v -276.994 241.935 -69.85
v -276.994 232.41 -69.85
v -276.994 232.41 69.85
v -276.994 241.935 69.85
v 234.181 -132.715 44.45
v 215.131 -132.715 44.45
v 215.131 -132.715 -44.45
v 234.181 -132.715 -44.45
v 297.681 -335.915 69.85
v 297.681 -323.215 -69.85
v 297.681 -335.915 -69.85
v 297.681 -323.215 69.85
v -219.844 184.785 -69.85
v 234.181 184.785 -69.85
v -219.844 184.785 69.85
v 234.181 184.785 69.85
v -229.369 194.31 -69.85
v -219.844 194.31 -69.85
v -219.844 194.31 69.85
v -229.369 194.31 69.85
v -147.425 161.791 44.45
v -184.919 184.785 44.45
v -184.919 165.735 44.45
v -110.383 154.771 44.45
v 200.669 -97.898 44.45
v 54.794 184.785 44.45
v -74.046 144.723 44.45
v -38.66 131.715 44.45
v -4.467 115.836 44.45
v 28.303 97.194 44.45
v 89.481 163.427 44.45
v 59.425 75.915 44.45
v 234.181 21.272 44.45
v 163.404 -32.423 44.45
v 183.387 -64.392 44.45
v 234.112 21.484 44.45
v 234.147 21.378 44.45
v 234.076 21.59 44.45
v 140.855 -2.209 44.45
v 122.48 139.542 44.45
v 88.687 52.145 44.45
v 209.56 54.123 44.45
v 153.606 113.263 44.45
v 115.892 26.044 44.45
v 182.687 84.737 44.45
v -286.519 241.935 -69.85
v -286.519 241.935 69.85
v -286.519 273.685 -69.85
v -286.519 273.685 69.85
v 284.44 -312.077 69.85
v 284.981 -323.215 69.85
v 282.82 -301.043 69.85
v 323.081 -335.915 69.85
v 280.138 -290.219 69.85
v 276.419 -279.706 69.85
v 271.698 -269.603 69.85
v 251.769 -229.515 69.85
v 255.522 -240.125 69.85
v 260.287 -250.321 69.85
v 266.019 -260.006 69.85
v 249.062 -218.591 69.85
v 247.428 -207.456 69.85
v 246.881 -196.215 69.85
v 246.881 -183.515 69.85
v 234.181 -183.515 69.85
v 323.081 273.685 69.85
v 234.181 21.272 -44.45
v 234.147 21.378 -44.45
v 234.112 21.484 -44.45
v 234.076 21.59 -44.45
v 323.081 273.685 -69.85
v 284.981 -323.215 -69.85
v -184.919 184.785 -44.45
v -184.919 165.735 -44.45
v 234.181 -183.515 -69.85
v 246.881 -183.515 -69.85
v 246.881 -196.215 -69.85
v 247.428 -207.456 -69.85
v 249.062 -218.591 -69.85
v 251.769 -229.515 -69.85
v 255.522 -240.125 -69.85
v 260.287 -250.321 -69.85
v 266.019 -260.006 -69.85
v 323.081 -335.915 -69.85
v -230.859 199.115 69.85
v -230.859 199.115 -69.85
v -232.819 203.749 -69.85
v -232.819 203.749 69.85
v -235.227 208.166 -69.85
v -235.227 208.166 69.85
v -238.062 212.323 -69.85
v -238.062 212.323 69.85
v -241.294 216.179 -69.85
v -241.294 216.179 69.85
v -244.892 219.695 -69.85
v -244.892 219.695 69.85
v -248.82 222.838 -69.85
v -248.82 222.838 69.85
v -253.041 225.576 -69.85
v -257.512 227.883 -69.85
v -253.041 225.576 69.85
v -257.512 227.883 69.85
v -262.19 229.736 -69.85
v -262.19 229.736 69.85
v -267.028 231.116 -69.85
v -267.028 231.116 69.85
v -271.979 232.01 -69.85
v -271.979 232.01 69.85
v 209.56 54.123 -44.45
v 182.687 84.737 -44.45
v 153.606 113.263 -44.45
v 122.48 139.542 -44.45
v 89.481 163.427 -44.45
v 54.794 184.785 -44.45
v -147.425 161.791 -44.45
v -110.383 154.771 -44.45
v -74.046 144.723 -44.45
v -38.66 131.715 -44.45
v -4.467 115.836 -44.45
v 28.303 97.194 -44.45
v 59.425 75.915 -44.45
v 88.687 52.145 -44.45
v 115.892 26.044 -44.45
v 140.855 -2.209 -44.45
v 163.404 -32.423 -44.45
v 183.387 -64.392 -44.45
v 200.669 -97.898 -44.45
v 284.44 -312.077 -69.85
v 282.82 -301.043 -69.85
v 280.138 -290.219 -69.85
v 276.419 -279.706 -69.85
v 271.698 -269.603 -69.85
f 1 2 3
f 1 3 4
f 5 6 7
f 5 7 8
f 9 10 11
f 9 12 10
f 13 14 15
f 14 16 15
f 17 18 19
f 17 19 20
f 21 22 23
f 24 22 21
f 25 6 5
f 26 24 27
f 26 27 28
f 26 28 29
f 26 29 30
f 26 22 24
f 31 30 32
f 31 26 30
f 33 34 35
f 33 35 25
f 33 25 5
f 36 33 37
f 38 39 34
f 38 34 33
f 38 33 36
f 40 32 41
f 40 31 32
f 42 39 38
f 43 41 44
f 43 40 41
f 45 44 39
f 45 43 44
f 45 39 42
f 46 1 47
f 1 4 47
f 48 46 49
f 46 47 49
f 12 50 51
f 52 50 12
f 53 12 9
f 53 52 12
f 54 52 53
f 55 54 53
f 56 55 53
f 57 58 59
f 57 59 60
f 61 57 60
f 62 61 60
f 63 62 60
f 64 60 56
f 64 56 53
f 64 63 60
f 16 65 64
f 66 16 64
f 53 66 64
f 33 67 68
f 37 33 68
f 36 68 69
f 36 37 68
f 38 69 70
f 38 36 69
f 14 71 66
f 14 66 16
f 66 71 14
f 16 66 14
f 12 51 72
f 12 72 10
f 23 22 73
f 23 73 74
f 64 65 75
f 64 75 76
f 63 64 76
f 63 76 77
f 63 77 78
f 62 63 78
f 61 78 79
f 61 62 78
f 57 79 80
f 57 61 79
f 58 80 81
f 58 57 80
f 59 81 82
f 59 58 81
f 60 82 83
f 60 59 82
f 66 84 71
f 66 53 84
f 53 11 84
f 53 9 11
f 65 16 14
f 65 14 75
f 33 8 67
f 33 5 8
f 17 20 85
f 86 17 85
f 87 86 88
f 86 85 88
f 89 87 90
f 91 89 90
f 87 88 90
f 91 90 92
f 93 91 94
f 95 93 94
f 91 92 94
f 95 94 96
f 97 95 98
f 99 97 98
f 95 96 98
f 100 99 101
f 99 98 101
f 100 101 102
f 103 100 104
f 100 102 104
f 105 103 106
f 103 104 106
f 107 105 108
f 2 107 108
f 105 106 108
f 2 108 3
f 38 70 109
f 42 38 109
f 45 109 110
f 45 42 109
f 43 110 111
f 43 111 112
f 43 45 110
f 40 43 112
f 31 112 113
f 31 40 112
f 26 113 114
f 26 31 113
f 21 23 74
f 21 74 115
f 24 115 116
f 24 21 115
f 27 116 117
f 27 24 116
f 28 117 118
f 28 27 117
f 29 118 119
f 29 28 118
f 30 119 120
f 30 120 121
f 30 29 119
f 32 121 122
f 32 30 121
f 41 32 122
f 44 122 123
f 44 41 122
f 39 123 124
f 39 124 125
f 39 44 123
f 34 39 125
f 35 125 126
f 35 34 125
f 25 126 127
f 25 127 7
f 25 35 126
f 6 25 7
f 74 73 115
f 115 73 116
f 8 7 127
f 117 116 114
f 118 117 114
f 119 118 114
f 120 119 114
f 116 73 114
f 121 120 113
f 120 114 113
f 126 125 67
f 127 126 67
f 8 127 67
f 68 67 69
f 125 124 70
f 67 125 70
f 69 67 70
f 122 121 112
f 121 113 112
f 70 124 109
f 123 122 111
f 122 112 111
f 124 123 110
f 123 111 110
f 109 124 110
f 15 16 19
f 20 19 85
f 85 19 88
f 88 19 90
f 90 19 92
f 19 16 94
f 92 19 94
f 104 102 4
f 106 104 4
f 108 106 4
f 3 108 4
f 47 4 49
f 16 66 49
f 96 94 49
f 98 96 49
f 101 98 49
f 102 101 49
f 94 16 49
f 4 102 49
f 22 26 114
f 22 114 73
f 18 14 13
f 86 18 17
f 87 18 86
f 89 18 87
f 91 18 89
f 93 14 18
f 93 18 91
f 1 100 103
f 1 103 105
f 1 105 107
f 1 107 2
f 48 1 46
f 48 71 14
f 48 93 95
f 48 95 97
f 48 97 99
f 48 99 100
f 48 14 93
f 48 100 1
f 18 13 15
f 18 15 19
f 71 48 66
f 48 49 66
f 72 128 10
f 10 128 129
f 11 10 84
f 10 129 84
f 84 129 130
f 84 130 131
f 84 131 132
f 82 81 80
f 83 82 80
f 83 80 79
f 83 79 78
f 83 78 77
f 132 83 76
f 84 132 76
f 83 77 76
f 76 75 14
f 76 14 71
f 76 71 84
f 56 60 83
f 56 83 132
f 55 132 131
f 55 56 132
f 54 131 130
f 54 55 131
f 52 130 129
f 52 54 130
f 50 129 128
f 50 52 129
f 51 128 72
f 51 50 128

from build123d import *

# Parameters (mm, degrees)
BOSS_EXTRUDE1_DEPTH = 69.85
BOSS_EXTRUDE2_DEPTH = 44.45
BOSS_EXTRUDE3_DEPTH = 69.85


with BuildPart() as part:
    # Sketch1 → Boss-Extrude1 (new body, symmetric)
    with BuildSketch(Plane.XY):
        with BuildLine():
            Line((-276.993776984, 232.41), (-276.993776984, 241.935))
            Line((-276.993776984, 241.935), (-286.518776984, 241.935))
            Line((-286.518776984, 241.935), (-286.518776984, 273.685))
            Line((-286.518776984, 273.685), (323.081223016, 273.685))
            Line((323.081223016, 273.685), (234.181223016, 184.785))
            Line((234.181223016, 184.785), (-219.843776984, 184.785))
            Line((-219.843776984, 184.785), (-219.843776984, 194.31))
            Line((-219.843776984, 194.31), (-229.368776984, 194.31))
            ThreePointArc((-229.368776984, 194.31), (-246.816968561, 221.315385529), (-276.993776984, 232.41))
        make_face()
    extrude(amount=BOSS_EXTRUDE1_DEPTH, both=True)


with BuildPart() as body_2:
    # Sketch1_3 → Boss-Extrude2 (new body, symmetric)
    with BuildSketch(Plane.XY):
        with BuildLine():
            ThreePointArc((234.076180436, 21.58989956), (153.606360894, 113.262953084), (54.793723016, 184.785))
            Line((54.793723016, 184.785), (-184.918776984, 184.785))
            Line((-184.918776984, 184.785), (-184.918776984, 165.735))
            ThreePointArc((-184.918776984, 165.735), (59.424504699, 75.915356299), (215.131223016, -132.715))
            Line((215.131223016, -132.715), (234.181223016, -132.715))
            Line((234.181223016, -132.715), (234.181223016, 21.2725))
            ThreePointArc((234.181223016, 21.2725), (234.129070962, 21.431321978), (234.076180436, 21.58989956))
        make_face()
    extrude(amount=BOSS_EXTRUDE2_DEPTH, both=True)


with BuildPart() as body_3:
    # Sketch1_4 → Boss-Extrude3 (new body, symmetric)
    with BuildSketch(Plane.XY):
        with BuildLine():
            Line((323.081223016, -335.915), (323.081223016, 273.685))
            Line((323.081223016, 273.685), (234.181223016, 184.785))
            Line((234.181223016, 184.785), (234.181223016, -183.515))
            Line((234.181223016, -183.515), (246.881223016, -183.515))
            Line((246.881223016, -183.515), (246.881223016, -196.215))
            ThreePointArc((246.881223016, -196.215), (251.768629387, -229.515028089), (266.018608337, -260.006284404))
            ThreePointArc((266.018608337, -260.006284404), (280.138450492, -290.219081757), (284.981223016, -323.215))
            Line((284.981223016, -323.215), (297.681223016, -323.215))
            Line((297.681223016, -323.215), (297.681223016, -335.915))
            Line((297.681223016, -335.915), (323.081223016, -335.915))
        make_face()
    extrude(amount=BOSS_EXTRUDE3_DEPTH, both=True)


solid = Compound([part.part, body_2.part, body_3.part])
